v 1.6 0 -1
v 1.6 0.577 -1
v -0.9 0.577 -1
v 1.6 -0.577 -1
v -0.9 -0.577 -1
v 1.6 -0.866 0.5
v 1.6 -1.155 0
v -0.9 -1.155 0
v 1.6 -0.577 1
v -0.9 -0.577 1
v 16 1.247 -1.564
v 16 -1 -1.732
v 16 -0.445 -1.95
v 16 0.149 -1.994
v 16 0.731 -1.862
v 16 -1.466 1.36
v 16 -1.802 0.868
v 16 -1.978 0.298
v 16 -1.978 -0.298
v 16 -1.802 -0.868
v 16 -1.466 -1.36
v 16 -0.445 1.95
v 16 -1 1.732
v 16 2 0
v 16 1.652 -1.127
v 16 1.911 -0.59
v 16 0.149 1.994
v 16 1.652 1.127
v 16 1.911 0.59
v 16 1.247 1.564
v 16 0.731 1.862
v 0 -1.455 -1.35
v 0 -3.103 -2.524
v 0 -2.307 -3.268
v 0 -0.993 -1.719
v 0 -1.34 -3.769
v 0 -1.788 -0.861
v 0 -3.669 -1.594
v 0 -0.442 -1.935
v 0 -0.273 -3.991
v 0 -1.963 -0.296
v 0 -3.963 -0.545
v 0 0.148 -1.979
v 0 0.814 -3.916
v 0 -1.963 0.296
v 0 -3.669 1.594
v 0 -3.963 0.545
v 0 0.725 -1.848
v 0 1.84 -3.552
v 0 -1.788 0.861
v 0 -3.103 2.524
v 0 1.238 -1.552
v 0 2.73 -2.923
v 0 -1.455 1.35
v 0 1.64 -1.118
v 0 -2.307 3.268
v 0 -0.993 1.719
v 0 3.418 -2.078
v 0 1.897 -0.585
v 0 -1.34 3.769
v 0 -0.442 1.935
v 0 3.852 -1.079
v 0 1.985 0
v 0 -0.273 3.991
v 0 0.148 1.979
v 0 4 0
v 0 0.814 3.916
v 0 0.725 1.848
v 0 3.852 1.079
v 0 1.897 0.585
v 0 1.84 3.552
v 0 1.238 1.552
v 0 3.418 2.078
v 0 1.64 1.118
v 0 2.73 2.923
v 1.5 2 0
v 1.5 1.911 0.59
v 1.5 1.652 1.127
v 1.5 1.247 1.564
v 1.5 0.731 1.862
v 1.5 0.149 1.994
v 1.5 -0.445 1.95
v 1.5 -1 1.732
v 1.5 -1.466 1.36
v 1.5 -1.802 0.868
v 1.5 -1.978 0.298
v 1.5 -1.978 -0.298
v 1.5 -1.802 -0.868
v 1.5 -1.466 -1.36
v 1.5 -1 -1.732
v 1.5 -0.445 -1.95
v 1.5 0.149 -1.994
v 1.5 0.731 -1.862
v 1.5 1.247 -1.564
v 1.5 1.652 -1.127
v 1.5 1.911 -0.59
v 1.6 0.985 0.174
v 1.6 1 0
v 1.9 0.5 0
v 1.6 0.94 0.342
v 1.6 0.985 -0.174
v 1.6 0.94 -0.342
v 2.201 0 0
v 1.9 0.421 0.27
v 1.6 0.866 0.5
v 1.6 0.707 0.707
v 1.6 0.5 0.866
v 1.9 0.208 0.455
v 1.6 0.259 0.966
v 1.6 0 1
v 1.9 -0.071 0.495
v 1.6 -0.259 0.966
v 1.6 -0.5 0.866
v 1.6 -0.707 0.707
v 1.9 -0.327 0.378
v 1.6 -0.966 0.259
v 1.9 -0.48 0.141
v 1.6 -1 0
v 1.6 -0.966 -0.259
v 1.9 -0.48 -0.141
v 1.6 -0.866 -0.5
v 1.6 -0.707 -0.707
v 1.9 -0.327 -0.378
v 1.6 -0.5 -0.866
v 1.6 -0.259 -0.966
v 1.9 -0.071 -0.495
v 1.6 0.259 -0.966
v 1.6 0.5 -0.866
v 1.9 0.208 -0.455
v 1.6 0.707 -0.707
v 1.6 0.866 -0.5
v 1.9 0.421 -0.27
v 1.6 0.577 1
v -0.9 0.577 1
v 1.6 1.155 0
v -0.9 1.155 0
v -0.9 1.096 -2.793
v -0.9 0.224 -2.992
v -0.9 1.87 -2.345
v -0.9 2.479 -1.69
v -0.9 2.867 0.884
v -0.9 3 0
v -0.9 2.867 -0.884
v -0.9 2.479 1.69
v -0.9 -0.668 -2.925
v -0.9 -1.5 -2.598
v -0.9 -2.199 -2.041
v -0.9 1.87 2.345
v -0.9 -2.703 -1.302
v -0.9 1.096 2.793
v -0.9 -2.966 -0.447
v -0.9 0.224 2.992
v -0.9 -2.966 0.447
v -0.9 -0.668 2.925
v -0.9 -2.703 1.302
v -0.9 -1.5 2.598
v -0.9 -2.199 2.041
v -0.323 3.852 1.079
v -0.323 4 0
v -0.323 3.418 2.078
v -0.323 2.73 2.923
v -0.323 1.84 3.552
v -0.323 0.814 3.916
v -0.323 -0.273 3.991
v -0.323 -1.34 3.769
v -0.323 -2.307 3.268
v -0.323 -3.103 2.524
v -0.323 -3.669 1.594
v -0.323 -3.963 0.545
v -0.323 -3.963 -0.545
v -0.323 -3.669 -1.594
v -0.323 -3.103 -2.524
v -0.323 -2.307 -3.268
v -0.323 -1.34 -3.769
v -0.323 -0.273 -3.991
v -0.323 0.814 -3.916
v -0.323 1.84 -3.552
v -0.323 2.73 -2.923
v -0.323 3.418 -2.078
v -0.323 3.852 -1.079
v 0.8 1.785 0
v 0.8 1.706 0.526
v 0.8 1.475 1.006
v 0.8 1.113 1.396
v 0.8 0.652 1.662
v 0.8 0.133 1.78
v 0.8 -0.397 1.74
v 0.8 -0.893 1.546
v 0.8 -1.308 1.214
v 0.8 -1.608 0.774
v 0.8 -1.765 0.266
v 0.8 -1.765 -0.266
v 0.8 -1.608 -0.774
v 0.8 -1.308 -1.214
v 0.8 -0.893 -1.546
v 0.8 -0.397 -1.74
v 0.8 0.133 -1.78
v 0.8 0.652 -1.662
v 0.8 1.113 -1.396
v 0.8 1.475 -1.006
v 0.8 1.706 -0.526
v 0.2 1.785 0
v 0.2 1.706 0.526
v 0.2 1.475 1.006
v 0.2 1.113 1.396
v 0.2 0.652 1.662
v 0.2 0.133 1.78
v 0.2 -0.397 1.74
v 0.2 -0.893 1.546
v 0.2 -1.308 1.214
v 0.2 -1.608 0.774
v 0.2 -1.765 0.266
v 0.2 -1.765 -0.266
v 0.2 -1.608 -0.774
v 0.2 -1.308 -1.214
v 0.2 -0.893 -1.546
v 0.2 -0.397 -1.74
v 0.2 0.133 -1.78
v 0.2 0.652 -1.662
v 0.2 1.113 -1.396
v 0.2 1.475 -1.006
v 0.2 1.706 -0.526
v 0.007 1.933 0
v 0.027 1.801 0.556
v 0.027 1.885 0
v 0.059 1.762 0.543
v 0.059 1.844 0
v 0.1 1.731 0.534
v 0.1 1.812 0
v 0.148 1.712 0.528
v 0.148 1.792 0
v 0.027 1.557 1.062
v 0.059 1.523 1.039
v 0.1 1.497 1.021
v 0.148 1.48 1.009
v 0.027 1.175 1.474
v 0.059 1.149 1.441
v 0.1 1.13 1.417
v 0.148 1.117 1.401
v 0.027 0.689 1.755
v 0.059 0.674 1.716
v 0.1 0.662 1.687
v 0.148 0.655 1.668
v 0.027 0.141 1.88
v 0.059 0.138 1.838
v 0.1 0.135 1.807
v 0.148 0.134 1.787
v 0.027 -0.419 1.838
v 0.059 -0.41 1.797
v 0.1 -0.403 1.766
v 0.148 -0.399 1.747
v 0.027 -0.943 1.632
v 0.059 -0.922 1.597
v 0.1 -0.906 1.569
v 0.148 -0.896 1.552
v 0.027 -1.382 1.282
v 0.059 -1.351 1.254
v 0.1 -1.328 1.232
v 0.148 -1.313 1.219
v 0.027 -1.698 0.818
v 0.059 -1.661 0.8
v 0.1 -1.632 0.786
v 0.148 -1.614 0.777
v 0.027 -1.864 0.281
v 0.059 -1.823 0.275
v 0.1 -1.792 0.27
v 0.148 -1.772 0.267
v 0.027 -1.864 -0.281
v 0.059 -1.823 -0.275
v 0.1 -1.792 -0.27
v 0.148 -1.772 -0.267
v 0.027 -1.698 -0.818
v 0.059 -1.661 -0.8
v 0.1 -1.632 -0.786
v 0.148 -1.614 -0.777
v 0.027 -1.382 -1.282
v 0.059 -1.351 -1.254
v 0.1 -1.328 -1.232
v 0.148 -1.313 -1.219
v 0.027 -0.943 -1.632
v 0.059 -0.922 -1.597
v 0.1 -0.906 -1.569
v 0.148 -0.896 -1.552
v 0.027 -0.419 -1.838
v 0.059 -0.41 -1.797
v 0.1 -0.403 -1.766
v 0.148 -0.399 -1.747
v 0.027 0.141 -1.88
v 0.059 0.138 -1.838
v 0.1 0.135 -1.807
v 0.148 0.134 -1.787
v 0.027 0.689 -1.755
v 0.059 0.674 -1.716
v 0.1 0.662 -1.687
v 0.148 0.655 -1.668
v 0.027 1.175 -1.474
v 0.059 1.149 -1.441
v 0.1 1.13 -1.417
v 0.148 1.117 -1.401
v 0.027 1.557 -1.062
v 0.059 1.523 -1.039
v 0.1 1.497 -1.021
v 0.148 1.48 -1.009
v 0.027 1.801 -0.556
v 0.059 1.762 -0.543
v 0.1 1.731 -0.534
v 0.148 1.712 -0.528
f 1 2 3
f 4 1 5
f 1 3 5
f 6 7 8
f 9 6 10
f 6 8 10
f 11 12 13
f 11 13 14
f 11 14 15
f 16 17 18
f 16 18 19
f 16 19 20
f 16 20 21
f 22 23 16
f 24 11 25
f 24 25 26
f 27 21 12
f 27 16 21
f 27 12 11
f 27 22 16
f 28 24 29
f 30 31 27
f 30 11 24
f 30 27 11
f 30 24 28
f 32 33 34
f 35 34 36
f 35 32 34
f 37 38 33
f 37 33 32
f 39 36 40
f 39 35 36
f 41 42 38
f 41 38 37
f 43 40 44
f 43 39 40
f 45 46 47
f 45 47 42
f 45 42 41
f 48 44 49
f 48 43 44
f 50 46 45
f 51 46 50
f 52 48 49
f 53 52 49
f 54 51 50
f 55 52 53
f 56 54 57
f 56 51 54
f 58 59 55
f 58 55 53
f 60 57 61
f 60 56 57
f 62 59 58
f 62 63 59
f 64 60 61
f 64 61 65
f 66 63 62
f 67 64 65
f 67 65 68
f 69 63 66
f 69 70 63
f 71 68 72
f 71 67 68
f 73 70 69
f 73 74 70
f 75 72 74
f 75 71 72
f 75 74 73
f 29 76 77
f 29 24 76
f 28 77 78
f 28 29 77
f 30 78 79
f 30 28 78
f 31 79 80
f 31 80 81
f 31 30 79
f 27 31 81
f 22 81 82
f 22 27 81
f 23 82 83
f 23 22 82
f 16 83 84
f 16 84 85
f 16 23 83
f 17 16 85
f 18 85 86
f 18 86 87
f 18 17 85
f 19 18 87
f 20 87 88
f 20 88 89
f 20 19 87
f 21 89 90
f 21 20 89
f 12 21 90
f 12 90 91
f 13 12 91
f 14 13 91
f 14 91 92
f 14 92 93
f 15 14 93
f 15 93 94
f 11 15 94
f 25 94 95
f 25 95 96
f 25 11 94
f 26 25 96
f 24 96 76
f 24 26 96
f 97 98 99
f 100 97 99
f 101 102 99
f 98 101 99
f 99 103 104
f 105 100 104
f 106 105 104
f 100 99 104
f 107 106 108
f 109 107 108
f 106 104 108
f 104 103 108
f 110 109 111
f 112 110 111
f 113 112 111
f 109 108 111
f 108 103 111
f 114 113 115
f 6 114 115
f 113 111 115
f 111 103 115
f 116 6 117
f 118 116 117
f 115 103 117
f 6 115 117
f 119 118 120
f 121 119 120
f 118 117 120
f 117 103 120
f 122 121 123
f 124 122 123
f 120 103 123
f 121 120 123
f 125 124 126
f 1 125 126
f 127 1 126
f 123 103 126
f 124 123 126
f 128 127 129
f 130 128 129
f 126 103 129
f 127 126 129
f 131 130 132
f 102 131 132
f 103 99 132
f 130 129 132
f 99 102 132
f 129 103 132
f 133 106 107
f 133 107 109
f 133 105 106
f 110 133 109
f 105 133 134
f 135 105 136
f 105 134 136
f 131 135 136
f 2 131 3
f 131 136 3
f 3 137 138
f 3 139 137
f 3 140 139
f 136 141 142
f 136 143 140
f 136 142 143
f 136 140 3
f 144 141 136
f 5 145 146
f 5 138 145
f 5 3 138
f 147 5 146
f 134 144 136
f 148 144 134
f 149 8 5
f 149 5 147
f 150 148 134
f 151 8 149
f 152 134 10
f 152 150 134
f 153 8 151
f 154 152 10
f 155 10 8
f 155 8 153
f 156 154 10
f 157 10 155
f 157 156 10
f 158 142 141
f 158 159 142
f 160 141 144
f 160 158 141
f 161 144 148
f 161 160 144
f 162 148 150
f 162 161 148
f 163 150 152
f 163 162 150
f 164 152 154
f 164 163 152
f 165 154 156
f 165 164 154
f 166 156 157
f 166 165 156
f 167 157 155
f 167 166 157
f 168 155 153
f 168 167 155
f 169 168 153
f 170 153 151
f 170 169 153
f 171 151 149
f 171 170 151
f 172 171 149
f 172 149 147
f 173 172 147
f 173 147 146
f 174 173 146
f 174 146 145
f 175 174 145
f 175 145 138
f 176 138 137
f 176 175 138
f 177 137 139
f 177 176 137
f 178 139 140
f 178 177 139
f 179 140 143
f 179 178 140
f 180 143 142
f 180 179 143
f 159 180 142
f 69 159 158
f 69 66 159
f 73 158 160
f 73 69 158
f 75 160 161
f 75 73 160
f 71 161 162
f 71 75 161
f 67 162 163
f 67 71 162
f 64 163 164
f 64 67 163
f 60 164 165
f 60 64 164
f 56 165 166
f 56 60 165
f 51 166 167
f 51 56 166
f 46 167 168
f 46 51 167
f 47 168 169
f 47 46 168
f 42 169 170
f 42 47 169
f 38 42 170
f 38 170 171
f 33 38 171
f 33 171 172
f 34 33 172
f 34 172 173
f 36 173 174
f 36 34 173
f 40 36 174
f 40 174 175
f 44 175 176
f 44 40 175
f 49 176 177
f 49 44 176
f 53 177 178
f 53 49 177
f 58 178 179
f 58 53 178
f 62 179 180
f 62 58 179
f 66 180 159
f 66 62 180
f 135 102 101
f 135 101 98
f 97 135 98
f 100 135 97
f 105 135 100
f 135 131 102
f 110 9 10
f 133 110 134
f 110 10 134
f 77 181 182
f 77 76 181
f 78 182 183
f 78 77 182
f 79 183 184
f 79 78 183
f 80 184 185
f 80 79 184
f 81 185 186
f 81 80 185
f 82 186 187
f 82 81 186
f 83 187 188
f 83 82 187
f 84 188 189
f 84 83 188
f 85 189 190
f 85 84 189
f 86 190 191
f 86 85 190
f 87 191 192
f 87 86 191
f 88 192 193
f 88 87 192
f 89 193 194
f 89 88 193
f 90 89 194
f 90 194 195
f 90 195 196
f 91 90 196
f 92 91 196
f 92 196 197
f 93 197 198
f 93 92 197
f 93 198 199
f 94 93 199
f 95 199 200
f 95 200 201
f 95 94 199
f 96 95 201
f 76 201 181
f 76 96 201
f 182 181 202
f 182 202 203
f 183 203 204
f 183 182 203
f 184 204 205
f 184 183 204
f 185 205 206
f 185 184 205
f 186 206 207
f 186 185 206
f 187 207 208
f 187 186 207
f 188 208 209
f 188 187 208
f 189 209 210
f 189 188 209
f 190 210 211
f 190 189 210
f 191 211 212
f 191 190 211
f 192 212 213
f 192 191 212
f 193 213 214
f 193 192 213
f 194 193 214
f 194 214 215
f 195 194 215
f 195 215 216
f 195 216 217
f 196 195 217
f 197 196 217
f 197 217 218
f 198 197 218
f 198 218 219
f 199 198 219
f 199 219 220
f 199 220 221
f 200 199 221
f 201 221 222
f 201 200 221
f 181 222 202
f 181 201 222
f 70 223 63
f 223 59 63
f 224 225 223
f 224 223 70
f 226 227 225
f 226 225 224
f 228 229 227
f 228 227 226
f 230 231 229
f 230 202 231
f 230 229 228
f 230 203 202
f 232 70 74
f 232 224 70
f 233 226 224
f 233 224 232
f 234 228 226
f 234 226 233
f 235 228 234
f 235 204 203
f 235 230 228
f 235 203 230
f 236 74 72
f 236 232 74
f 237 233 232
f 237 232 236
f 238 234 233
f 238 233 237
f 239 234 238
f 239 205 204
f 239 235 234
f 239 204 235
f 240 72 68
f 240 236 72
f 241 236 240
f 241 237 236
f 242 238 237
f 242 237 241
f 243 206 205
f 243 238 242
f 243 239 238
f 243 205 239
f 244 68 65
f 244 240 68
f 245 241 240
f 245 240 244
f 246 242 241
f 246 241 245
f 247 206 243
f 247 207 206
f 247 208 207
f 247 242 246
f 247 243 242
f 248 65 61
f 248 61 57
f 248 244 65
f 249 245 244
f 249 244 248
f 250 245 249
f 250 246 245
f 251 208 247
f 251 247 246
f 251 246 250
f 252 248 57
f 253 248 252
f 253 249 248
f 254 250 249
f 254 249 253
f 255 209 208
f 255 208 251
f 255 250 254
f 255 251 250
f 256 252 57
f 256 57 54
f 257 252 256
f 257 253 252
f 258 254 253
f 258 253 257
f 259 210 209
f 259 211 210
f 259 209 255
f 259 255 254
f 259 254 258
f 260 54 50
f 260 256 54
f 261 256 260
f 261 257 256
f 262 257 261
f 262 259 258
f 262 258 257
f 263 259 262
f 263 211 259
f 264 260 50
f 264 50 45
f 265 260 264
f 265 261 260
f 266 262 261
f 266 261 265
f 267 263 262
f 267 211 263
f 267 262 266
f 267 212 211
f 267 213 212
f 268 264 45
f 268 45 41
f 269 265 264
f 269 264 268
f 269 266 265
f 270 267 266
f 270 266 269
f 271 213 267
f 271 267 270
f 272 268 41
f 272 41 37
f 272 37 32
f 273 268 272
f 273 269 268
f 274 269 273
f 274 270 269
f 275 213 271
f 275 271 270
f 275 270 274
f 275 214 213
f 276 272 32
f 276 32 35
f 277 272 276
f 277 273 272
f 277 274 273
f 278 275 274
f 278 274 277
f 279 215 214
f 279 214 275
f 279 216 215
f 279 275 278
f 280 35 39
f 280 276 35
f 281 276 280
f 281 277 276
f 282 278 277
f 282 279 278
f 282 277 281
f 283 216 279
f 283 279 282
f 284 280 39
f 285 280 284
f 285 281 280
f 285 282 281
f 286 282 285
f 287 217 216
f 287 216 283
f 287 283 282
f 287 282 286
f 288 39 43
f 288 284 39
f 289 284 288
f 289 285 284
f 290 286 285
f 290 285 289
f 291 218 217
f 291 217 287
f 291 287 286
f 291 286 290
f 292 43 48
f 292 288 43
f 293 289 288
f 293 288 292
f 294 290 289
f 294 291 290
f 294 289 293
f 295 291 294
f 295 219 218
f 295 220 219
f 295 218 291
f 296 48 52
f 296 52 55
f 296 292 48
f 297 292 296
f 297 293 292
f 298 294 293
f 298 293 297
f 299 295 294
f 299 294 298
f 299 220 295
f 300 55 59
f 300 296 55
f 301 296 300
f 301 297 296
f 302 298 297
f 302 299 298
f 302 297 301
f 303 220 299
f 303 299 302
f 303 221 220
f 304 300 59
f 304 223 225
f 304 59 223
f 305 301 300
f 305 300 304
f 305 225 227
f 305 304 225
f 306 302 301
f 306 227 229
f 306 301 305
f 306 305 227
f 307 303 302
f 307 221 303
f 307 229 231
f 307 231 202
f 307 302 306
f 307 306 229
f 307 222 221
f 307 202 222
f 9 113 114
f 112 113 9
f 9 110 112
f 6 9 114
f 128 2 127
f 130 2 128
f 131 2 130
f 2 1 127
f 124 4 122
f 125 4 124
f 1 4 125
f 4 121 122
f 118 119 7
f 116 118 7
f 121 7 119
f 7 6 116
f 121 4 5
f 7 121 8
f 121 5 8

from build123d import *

# Parameters (mm, degrees)
FILLET1_R          = 0.2
CUT_EXTRUDE1_DEPTH = 2.5


with BuildPart() as part:
    # Sketch1 → Revolve1 (revolve)
    with BuildSketch(Plane.XY):
        Polygon((-0.9, 0), (-0.9, 3), (-0.322649731, 4), (0, 4), (0, 1.785), (0.8, 1.785), (1.5, 2), (16, 2), (16, 0), align=None)
    revolve(axis=Axis((-0.9, 0, 0), (1, 0, 0)))

    # Fillet1
    fillet1_edges = [part.edges().sort_by_distance(p)[0] for p in [
        (0, -1.785, 0),
    ]]
    fillet(fillet1_edges, radius=FILLET1_R)

    # Sketch2 → Cut-Extrude1 (cut)
    with BuildSketch(Plane.ZY.offset(0.9)):
        Polygon((0, 1.154700538), (-1, 0.577350269), (-1, -0.577350269), (0, -1.154700538), (1, -0.577350269), (1, 0.577350269), align=None)
    extrude(amount=-CUT_EXTRUDE1_DEPTH, mode=Mode.SUBTRACT)

    # Sketch3 → Cut-Revolve1 (revolve, cut)
    with BuildSketch(Plane.XY):
        Polygon((1.6, 0), (1.6, 1), (2.200860619, 0), align=None)
    revolve(axis=Axis((1.6, 0, 0), (1, 0, 0)), mode=Mode.SUBTRACT)


solid = part.part
